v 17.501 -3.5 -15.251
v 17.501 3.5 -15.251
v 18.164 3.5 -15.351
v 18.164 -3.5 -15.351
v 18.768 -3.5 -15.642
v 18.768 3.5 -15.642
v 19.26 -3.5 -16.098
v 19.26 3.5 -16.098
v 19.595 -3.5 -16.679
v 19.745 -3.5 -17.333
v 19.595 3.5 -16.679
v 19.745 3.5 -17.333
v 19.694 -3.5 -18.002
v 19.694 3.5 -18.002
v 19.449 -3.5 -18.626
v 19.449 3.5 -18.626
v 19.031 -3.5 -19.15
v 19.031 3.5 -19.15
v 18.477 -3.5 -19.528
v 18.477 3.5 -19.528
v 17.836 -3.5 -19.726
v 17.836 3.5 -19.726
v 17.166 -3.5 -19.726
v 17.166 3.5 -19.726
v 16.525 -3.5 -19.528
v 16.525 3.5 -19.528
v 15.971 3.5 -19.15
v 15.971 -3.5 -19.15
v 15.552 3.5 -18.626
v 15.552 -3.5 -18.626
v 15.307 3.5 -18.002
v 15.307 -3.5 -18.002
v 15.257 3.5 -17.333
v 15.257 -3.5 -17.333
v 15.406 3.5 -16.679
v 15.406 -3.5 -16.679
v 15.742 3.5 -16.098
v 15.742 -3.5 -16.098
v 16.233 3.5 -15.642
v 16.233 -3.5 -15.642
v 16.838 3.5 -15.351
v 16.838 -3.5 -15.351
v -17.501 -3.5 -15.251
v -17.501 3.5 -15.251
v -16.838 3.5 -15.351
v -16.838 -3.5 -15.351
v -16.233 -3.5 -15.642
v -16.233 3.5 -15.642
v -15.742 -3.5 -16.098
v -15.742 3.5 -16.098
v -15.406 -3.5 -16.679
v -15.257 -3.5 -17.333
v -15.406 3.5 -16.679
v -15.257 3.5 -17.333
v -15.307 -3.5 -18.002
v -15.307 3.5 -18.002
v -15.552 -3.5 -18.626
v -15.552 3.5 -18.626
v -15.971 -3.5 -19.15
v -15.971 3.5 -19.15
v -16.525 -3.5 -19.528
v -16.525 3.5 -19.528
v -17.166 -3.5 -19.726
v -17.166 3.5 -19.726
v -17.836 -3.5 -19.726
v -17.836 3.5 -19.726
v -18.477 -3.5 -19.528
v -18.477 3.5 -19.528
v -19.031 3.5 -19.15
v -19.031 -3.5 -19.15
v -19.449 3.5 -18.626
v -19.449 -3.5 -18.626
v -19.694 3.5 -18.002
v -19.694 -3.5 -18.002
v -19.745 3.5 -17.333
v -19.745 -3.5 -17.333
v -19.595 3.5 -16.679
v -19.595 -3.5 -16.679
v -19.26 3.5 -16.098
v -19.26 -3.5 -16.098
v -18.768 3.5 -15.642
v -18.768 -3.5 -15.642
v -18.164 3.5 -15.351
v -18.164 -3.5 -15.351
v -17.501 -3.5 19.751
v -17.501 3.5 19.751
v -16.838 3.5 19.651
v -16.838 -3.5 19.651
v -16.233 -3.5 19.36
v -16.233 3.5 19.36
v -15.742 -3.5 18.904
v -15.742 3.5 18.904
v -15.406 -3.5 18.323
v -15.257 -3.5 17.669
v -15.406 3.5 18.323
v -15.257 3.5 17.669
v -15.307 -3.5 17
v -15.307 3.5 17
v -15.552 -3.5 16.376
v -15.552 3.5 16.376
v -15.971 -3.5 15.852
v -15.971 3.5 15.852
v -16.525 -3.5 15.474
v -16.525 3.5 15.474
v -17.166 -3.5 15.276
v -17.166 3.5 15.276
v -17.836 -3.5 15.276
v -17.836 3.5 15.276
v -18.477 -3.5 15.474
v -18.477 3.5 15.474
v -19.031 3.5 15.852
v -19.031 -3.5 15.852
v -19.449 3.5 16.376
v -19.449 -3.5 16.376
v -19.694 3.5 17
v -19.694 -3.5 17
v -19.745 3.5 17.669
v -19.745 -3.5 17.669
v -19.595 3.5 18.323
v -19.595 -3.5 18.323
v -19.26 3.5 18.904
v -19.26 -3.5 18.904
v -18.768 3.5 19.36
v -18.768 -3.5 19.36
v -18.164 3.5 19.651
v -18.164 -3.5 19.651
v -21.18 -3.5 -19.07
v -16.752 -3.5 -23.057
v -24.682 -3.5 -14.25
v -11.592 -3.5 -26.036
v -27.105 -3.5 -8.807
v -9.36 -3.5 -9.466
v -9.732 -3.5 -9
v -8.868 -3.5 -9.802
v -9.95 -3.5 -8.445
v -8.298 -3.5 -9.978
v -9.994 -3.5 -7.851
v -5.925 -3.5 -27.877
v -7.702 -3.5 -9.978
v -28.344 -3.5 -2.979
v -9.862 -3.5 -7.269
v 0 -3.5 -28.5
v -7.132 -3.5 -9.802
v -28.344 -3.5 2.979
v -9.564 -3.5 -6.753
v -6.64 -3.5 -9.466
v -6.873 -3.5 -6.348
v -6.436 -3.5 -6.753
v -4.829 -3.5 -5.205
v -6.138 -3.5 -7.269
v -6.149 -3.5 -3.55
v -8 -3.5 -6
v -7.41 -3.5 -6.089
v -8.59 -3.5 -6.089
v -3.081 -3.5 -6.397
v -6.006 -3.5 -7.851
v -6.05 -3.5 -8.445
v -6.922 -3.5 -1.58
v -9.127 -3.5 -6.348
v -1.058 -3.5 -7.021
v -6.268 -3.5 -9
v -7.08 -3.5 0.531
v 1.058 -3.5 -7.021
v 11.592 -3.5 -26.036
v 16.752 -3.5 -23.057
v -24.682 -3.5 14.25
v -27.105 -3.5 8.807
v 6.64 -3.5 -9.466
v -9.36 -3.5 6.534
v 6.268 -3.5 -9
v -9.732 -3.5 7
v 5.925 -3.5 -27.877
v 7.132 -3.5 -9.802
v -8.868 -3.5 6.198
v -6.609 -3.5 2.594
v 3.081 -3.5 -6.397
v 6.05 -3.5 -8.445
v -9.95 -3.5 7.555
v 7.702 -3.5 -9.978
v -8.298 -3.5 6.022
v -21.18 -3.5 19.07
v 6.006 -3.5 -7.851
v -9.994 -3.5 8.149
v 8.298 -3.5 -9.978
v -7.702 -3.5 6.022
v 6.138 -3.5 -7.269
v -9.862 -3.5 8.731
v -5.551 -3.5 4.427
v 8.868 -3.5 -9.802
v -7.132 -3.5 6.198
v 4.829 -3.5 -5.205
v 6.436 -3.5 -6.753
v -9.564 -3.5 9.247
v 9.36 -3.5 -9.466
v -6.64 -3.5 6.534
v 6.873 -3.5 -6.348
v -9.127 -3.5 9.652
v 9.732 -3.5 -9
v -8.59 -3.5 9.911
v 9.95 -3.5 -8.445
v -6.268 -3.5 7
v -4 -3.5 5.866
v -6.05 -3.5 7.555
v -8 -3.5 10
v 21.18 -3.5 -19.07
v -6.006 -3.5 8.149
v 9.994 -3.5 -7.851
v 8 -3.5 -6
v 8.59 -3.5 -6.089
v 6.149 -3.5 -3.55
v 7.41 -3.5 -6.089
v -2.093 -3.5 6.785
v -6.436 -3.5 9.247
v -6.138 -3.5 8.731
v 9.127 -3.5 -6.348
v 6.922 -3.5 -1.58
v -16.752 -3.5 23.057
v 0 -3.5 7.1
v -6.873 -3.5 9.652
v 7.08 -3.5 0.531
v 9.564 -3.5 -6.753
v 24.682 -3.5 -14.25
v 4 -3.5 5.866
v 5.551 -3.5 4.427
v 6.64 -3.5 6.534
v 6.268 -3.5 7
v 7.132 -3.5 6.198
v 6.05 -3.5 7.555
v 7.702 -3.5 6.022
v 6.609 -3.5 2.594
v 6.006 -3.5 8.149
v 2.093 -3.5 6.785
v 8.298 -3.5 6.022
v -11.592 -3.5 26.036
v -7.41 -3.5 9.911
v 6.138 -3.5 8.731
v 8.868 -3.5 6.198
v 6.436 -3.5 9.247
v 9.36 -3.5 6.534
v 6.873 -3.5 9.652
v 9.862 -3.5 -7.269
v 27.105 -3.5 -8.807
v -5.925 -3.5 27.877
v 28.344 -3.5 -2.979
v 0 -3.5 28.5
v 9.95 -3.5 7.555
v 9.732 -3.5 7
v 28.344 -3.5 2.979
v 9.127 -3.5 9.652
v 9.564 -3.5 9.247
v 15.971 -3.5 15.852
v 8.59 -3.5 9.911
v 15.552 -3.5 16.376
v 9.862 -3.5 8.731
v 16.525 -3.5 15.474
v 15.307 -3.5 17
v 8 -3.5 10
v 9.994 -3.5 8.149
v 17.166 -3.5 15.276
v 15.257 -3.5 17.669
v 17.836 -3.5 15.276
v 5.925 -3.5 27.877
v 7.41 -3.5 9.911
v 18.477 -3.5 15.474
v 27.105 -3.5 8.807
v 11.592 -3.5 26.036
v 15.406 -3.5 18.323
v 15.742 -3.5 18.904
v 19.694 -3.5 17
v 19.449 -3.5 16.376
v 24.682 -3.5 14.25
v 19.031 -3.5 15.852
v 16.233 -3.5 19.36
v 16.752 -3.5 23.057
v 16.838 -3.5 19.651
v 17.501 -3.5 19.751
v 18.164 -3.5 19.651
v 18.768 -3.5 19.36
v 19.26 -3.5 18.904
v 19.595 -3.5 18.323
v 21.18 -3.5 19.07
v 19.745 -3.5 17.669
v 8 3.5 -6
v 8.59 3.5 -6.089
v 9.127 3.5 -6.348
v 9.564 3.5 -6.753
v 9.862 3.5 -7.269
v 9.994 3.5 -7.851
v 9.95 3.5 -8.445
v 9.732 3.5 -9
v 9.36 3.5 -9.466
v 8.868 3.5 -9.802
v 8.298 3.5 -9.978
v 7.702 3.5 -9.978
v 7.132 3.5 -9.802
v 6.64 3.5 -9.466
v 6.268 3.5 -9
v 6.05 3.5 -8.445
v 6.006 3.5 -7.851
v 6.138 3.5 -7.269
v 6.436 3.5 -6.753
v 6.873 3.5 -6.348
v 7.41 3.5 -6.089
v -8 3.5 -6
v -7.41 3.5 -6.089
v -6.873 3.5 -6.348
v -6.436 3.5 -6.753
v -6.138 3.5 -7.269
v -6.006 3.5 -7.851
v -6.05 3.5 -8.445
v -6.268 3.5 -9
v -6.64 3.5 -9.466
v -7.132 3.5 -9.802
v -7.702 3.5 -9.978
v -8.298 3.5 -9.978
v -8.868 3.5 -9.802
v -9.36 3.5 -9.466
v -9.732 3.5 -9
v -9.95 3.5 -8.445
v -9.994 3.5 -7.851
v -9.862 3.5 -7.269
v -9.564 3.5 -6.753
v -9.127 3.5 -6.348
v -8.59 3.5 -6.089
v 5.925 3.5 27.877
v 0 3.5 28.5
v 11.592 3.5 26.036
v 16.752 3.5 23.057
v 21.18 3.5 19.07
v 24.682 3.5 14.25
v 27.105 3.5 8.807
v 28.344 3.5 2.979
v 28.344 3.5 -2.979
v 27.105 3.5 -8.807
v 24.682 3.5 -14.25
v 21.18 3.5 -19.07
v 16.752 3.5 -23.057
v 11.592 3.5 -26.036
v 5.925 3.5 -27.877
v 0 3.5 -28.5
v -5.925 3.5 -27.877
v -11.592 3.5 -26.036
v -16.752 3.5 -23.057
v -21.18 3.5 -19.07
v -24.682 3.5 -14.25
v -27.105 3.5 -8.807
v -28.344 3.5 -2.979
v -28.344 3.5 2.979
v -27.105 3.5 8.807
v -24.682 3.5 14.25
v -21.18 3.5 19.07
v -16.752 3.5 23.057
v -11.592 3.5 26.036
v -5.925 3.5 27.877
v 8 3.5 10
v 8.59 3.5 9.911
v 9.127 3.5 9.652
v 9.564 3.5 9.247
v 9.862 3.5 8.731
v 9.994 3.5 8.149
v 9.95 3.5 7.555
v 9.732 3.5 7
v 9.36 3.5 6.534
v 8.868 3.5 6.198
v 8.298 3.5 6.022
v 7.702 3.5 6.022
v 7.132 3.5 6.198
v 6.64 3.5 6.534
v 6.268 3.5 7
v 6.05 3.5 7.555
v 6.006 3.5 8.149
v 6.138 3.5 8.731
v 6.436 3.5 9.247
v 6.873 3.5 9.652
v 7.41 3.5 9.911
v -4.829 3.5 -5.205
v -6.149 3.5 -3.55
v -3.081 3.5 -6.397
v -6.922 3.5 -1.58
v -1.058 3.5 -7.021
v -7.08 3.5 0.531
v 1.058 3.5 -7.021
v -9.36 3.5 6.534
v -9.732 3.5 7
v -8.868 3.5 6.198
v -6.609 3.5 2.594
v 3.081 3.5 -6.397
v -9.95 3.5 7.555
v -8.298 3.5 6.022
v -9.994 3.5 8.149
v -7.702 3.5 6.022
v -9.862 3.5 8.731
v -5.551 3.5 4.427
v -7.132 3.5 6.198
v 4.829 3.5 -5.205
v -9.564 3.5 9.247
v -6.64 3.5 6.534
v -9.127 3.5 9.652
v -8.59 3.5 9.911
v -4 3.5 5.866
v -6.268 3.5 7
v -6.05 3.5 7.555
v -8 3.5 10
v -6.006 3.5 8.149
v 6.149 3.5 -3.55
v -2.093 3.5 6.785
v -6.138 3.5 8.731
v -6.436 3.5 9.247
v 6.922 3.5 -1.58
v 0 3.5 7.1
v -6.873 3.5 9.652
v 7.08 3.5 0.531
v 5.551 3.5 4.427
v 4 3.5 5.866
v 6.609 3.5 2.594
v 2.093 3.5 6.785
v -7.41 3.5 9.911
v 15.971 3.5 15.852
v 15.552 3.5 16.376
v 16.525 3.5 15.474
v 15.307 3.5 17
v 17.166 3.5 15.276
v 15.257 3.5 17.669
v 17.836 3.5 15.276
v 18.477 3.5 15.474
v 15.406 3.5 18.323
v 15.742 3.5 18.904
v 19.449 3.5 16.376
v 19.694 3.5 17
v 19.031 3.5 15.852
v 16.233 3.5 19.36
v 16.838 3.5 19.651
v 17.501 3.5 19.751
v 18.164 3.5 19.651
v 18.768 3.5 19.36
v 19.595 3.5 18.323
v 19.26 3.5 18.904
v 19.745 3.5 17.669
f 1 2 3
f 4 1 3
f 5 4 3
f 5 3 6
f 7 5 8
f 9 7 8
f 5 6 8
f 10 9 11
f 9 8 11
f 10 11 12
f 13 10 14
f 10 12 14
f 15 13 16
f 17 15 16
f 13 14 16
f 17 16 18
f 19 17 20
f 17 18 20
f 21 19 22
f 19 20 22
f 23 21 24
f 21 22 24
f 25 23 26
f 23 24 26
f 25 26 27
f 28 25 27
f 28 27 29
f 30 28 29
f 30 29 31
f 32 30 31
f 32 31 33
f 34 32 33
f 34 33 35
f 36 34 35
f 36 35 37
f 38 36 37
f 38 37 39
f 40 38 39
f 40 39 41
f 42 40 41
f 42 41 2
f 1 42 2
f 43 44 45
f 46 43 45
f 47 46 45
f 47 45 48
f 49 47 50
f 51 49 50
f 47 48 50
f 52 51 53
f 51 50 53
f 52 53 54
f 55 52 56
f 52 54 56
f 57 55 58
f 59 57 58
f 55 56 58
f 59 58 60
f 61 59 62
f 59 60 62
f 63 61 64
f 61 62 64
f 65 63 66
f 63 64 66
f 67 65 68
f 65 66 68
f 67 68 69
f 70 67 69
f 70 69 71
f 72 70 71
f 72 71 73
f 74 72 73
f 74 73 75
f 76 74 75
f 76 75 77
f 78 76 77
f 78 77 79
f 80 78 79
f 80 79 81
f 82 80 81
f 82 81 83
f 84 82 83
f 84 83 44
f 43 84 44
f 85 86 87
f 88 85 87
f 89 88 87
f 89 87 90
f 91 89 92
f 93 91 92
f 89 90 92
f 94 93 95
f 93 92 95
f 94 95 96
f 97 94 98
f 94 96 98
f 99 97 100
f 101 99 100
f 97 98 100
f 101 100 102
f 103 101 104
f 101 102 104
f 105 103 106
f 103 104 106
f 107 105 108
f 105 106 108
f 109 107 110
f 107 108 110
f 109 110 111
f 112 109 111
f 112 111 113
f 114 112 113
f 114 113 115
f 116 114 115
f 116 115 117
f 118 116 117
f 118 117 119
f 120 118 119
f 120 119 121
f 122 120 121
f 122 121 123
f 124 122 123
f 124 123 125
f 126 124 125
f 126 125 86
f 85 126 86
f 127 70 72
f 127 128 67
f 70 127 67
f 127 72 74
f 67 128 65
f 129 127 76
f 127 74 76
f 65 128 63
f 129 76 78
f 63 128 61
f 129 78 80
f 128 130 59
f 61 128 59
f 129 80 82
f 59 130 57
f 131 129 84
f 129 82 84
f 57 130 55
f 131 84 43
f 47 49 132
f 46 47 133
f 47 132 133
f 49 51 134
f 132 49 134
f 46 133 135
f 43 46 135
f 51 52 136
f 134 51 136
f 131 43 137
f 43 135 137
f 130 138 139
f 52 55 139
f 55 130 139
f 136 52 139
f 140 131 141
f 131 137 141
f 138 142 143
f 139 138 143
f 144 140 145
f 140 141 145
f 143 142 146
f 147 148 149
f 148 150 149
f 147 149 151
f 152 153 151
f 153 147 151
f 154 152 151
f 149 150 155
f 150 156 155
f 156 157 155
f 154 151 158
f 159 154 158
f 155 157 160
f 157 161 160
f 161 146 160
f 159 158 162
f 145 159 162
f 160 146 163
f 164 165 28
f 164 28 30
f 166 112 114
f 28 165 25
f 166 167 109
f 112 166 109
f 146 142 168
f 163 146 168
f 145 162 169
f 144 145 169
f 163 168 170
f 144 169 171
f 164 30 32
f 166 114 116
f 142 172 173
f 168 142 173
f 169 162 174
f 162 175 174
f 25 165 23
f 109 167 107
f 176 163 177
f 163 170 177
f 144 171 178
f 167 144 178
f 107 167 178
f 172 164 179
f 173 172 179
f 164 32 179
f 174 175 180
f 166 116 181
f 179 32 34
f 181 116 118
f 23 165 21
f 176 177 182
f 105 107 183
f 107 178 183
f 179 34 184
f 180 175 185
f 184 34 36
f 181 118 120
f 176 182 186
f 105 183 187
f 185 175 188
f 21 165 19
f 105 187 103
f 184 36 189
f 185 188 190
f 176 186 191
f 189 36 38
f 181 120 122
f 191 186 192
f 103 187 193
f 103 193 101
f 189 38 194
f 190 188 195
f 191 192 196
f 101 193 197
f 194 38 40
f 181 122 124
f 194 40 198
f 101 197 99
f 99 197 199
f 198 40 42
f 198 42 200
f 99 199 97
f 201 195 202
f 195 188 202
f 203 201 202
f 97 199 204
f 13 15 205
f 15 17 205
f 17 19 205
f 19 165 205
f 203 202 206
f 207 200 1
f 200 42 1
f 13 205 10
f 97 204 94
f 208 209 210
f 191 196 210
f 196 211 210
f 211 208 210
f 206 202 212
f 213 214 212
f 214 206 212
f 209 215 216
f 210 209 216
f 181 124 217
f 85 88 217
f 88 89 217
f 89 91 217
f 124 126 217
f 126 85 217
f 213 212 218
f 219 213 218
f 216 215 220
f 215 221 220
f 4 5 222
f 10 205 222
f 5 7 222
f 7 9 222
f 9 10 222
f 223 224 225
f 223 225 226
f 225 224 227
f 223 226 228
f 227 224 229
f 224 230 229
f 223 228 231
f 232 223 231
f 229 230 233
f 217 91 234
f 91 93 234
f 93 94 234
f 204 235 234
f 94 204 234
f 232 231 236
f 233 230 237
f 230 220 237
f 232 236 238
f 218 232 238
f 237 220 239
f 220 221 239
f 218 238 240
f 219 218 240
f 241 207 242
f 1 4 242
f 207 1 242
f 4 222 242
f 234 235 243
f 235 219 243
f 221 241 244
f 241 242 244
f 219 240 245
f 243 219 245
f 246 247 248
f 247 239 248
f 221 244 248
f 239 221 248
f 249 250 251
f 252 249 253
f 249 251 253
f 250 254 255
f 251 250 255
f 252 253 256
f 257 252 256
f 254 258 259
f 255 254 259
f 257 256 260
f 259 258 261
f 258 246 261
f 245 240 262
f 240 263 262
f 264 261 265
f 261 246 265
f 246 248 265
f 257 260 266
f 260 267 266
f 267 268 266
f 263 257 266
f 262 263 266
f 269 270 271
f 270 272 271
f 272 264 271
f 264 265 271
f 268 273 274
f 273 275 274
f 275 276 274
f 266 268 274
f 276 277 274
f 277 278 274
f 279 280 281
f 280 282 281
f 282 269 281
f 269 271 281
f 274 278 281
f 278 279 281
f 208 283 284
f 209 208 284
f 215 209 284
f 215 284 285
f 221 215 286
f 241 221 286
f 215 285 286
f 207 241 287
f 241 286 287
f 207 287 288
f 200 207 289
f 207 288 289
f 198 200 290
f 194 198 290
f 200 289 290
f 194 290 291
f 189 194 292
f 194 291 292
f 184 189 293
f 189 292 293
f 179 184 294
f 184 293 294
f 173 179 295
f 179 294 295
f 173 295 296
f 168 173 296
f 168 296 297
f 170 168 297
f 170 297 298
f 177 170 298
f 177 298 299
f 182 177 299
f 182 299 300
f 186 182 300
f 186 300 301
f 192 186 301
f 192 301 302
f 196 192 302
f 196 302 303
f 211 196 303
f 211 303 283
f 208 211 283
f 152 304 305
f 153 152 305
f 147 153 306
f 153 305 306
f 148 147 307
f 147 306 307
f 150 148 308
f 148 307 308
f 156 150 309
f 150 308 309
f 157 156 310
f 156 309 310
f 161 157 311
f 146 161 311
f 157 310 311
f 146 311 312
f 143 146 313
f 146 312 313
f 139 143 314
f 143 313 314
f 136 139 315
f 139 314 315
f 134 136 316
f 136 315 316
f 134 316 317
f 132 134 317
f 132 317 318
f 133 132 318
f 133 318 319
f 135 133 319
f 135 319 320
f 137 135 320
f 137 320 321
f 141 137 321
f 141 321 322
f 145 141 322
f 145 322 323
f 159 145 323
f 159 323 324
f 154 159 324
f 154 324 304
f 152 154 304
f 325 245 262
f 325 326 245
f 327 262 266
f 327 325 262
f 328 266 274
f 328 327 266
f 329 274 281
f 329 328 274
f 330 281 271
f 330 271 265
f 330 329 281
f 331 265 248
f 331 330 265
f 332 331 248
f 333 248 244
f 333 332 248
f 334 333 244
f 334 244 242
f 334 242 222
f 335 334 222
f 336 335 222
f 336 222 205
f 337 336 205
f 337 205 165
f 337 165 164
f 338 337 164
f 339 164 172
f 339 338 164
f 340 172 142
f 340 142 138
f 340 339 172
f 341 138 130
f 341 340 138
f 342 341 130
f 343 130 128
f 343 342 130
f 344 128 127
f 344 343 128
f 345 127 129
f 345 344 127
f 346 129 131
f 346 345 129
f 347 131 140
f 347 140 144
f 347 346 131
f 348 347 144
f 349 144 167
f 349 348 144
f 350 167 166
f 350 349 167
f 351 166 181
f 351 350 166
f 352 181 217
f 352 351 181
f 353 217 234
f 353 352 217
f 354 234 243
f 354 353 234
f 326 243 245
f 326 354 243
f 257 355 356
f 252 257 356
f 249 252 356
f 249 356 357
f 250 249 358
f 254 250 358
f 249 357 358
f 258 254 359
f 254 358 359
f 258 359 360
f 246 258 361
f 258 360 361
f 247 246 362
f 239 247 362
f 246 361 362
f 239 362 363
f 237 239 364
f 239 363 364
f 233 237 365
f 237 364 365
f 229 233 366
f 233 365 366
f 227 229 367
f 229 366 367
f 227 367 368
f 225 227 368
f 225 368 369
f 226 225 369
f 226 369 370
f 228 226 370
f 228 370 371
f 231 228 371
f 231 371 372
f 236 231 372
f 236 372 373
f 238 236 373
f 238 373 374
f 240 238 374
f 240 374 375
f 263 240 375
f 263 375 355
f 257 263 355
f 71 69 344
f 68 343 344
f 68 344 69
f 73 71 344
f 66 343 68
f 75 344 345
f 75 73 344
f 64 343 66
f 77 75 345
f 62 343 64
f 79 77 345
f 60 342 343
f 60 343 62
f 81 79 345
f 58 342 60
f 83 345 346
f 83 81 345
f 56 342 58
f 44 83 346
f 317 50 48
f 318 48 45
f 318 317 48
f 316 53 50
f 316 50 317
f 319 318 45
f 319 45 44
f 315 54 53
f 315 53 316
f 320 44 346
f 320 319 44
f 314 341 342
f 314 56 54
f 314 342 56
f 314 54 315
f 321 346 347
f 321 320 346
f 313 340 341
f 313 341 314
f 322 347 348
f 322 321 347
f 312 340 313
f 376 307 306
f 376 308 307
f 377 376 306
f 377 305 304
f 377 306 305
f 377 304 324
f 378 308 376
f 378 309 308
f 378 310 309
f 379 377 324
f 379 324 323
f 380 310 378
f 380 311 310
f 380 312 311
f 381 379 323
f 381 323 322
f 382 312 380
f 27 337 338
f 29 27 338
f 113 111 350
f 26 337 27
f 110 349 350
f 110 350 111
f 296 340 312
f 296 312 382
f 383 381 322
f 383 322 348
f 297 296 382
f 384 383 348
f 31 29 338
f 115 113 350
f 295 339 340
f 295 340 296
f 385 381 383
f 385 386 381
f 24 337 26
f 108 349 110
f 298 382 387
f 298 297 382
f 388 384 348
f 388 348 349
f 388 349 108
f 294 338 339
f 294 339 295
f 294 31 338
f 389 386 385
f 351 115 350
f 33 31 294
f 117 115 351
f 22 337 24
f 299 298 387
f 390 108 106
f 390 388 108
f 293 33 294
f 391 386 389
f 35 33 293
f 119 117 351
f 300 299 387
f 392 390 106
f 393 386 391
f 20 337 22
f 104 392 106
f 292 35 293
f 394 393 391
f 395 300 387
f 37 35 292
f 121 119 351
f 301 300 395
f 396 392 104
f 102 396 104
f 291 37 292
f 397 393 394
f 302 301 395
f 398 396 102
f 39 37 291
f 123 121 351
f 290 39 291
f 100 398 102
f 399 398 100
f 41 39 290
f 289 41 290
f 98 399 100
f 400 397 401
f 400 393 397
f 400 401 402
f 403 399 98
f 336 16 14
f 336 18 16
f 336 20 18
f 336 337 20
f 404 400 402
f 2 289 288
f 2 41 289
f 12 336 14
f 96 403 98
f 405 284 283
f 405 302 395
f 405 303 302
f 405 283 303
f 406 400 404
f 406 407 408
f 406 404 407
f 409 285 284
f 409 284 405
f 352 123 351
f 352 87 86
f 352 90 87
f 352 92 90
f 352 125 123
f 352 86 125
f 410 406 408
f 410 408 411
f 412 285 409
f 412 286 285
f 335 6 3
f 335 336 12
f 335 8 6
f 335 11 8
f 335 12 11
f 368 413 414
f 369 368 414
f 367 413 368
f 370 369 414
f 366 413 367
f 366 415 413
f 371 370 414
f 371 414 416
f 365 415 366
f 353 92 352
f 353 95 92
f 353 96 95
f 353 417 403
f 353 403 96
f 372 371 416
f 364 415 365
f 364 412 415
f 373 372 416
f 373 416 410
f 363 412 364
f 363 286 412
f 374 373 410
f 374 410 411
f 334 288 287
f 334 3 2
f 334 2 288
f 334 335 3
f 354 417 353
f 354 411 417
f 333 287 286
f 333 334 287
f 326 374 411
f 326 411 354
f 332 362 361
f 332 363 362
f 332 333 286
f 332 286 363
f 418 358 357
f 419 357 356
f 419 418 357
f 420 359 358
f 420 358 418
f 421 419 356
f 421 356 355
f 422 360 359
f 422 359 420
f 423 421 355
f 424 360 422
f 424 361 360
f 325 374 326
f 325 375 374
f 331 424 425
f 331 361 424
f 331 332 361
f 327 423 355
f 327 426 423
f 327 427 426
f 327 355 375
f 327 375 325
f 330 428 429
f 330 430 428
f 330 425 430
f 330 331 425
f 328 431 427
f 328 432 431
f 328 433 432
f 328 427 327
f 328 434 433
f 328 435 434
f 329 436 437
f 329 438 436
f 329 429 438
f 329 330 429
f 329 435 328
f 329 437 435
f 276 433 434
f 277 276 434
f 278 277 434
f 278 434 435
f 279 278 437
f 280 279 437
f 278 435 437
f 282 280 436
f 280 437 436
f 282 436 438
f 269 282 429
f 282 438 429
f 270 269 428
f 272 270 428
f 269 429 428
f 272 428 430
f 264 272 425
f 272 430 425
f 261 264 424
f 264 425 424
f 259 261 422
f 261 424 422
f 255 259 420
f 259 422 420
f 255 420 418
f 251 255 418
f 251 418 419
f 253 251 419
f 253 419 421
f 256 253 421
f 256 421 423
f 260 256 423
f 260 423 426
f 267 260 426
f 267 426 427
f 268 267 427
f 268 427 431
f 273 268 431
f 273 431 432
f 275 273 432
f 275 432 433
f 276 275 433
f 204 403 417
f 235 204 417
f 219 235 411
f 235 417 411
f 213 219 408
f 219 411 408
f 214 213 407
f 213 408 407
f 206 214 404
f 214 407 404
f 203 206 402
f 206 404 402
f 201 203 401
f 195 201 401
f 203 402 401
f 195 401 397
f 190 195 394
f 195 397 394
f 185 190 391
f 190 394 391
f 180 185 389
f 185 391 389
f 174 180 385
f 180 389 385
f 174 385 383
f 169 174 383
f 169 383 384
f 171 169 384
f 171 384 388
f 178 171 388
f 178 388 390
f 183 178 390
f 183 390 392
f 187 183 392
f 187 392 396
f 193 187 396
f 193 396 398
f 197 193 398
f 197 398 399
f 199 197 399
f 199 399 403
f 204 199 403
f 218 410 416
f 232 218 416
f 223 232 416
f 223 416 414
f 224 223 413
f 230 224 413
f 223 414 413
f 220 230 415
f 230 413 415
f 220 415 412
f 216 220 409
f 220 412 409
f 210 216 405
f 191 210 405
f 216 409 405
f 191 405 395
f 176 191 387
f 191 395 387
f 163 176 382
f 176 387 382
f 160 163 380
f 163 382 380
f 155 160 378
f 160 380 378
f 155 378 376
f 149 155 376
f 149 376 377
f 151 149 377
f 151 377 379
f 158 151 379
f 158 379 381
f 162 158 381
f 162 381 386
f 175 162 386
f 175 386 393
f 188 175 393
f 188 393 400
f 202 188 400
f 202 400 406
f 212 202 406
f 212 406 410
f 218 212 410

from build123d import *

# Parameters (mm, degrees)
SKETCH1_R           = 28.5
BOSS_EXTRUDE1_DEPTH = 3.5
SKETCH2_R           = 2.25
SKETCH2_R_2         = 2
CUT_EXTRUDE1_DEPTH  = 41.908434338
SKETCH3_R           = 7.1
CUT_EXTRUDE2_DEPTH  = 41.908434338


with BuildPart() as part:
    # Sketch1 → Boss-Extrude1 (new, symmetric)
    with BuildSketch(Plane(origin=(0, 0, 0), x_dir=(1, 0, 0), z_dir=(0, 1, 0))):
        with Locations(Location((0, 0, 0), (0, 0, 270))):
            Circle(SKETCH1_R)
    extrude(amount=BOSS_EXTRUDE1_DEPTH, both=True)

    # Sketch2 → Cut-Extrude1 (cut, through all)
    with BuildSketch(Plane(origin=(0, 3.5, 0), x_dir=(1, 0, 0), z_dir=(0, 1, 0))):
        with Locations(Location((17.500892834, 17.500892834, 0), (0, 0, 270))):
            Circle(SKETCH2_R)
        with Locations(Location((17.500892834, -17.500892834, 0), (0, 0, 270))):
            Circle(SKETCH2_R)
        with Locations(Location((-17.500892834, -17.500892834, 0), (0, 0, 270))):
            Circle(SKETCH2_R)
        with Locations(Location((-17.500892834, 17.500892834, 0), (0, 0, 270))):
            Circle(SKETCH2_R)
        with Locations(Location((-8, -8, 0), (0, 0, 270))):
            Circle(SKETCH2_R_2)
        with Locations(Location((-8, 8, 0), (0, 0, 270))):
            Circle(SKETCH2_R_2)
        with Locations(Location((8, 8, 0), (0, 0, 270))):
            Circle(SKETCH2_R_2)
        with Locations(Location((8, -8, 0), (0, 0, 270))):
            Circle(SKETCH2_R_2)
    extrude(amount=-CUT_EXTRUDE1_DEPTH, mode=Mode.SUBTRACT)

    # Sketch3 → Cut-Extrude2 (cut, through all)
    with BuildSketch(Plane(origin=(0, 3.5, 0), x_dir=(1, 0, 0), z_dir=(0, 1, 0))):
        with Locations(Location((0, 0, 0), (0, 0, 270))):
            Circle(SKETCH3_R)
    extrude(amount=-CUT_EXTRUDE2_DEPTH, mode=Mode.SUBTRACT)


solid = part.part
